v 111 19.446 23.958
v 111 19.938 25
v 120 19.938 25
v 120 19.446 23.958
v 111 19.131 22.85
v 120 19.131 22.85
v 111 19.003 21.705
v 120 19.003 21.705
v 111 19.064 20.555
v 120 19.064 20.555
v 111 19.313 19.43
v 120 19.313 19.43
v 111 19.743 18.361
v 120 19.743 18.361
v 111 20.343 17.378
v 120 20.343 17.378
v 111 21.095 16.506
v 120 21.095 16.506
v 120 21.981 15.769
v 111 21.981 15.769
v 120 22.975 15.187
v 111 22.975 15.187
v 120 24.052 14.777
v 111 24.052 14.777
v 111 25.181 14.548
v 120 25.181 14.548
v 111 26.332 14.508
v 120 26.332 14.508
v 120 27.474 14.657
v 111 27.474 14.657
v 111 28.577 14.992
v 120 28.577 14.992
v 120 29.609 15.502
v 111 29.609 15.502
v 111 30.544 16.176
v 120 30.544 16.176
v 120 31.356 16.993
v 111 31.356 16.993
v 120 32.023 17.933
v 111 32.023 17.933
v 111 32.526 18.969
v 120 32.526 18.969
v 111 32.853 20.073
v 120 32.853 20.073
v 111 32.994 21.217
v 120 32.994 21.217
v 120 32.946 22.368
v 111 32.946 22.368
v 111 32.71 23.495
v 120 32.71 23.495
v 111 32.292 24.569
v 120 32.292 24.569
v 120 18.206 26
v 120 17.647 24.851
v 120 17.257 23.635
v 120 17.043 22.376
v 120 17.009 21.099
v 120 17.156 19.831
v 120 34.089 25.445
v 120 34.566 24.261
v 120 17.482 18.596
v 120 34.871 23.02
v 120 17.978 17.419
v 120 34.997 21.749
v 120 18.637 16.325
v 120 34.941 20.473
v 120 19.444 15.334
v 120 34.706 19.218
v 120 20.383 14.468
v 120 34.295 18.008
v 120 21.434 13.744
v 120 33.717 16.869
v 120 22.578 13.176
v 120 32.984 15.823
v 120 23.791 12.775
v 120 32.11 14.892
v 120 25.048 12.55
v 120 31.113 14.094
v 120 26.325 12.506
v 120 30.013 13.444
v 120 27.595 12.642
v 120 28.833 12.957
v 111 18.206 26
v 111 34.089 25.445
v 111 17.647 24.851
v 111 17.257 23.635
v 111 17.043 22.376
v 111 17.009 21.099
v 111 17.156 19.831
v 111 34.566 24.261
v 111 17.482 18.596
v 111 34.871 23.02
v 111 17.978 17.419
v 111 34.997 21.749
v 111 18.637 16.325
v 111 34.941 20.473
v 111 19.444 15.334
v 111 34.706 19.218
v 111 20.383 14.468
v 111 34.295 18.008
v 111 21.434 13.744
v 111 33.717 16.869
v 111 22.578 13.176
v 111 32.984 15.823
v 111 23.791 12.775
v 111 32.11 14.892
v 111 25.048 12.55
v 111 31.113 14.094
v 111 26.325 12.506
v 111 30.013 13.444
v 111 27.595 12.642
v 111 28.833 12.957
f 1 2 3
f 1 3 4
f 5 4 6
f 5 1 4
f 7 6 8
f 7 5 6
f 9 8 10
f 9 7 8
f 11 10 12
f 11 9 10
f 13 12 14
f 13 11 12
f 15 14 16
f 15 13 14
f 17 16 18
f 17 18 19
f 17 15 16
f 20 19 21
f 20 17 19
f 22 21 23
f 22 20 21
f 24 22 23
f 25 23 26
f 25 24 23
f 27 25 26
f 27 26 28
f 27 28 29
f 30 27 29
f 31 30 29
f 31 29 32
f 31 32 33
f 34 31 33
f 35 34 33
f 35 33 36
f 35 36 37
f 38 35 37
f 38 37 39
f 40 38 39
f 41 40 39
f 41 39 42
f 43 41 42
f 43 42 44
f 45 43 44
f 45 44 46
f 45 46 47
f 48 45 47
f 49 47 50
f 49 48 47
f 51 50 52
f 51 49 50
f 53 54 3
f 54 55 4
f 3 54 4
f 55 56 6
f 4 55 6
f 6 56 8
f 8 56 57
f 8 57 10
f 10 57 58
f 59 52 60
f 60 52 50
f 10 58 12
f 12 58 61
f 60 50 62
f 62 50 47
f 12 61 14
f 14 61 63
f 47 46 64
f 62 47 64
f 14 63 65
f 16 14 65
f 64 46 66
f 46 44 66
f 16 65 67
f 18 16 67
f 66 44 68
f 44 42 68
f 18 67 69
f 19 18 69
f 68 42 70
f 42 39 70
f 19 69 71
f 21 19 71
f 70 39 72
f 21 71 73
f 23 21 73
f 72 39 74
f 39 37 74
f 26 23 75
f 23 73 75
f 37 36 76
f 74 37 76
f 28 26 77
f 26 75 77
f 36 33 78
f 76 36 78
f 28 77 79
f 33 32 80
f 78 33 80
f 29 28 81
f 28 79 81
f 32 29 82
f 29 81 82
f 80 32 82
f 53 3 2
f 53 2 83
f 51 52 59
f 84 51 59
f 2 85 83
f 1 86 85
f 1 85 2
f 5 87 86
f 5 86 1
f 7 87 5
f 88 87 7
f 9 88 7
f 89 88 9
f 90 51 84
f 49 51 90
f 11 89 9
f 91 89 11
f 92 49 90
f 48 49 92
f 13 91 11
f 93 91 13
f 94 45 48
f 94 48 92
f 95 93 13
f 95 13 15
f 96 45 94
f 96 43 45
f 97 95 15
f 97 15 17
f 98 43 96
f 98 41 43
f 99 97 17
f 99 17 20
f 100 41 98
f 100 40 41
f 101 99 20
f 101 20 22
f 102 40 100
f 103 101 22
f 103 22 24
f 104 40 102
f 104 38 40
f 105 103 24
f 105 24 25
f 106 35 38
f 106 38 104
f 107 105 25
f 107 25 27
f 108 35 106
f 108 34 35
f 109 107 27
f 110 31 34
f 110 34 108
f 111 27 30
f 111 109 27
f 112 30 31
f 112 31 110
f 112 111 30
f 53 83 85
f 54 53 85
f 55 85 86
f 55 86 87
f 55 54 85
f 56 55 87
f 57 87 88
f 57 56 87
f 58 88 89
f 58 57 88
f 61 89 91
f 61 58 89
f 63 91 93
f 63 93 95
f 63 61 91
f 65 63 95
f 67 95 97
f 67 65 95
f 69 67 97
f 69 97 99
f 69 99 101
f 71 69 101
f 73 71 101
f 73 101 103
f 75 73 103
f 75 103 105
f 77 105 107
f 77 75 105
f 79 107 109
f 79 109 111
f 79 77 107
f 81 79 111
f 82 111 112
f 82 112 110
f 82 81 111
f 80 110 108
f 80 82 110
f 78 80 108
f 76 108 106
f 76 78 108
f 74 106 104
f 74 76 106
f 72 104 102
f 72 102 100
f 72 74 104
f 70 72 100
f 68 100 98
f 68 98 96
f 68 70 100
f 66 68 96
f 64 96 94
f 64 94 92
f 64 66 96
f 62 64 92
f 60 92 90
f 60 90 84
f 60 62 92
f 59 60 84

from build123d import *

# Parameters (mm, degrees)
CYLINDER103_R          = 7
CYLINDER103_DEPTH      = 9
CYLINDER104_W          = 9
CYLINDER104_H          = 9
CYLINDER104_ANGLE      = 236
CUT006_ROLL_ANGLE      = -90
CUT006_PITCH_ANGLE     = -30
CUT006_PLACEMENT_ANGLE = -90


with BuildPart() as syringe_hole:
    # Cylinder103 → Cylinder103 (new body)
    with BuildSketch(Plane.XY):
        Circle(CYLINDER103_R)
    extrude(amount=CYLINDER103_DEPTH)


with BuildPart() as syringe_hole_cut:
    # Cylinder104 → Cylinder104 (revolve)
    with BuildSketch(Plane.XZ):
        with Locations((4.5, 4.5)):
            Rectangle(CYLINDER104_W, CYLINDER104_H)
    revolve(axis=Axis((0, 0, 0), (0, 0, 1)), revolution_arc=CYLINDER104_ANGLE)

    # Cut006: cut syringe hole
    add(syringe_hole.part, mode=Mode.SUBTRACT)


with BuildPart() as syringe_hole_cut_1:
    # Cut006 roll: moved
    add(syringe_hole_cut.part.rotate(Axis((0, 0, 0), (1, 0, 0)), CUT006_ROLL_ANGLE))


with BuildPart() as syringe_hole_cut_2:
    # Cut006 pitch: moved
    add(syringe_hole_cut_1.part.rotate(Axis((0, 0, 0), (0, 1, 0)), CUT006_PITCH_ANGLE))


with BuildPart() as syringe_hole_cut_3:
    # Cut006 placement: moved
    add(syringe_hole_cut_2.part.moved(Location((111, 26, 21.5))).rotate(Axis((111, 26, 21.5), (0, 0, 1)), CUT006_PLACEMENT_ANGLE))


solid = syringe_hole_cut_3.part
